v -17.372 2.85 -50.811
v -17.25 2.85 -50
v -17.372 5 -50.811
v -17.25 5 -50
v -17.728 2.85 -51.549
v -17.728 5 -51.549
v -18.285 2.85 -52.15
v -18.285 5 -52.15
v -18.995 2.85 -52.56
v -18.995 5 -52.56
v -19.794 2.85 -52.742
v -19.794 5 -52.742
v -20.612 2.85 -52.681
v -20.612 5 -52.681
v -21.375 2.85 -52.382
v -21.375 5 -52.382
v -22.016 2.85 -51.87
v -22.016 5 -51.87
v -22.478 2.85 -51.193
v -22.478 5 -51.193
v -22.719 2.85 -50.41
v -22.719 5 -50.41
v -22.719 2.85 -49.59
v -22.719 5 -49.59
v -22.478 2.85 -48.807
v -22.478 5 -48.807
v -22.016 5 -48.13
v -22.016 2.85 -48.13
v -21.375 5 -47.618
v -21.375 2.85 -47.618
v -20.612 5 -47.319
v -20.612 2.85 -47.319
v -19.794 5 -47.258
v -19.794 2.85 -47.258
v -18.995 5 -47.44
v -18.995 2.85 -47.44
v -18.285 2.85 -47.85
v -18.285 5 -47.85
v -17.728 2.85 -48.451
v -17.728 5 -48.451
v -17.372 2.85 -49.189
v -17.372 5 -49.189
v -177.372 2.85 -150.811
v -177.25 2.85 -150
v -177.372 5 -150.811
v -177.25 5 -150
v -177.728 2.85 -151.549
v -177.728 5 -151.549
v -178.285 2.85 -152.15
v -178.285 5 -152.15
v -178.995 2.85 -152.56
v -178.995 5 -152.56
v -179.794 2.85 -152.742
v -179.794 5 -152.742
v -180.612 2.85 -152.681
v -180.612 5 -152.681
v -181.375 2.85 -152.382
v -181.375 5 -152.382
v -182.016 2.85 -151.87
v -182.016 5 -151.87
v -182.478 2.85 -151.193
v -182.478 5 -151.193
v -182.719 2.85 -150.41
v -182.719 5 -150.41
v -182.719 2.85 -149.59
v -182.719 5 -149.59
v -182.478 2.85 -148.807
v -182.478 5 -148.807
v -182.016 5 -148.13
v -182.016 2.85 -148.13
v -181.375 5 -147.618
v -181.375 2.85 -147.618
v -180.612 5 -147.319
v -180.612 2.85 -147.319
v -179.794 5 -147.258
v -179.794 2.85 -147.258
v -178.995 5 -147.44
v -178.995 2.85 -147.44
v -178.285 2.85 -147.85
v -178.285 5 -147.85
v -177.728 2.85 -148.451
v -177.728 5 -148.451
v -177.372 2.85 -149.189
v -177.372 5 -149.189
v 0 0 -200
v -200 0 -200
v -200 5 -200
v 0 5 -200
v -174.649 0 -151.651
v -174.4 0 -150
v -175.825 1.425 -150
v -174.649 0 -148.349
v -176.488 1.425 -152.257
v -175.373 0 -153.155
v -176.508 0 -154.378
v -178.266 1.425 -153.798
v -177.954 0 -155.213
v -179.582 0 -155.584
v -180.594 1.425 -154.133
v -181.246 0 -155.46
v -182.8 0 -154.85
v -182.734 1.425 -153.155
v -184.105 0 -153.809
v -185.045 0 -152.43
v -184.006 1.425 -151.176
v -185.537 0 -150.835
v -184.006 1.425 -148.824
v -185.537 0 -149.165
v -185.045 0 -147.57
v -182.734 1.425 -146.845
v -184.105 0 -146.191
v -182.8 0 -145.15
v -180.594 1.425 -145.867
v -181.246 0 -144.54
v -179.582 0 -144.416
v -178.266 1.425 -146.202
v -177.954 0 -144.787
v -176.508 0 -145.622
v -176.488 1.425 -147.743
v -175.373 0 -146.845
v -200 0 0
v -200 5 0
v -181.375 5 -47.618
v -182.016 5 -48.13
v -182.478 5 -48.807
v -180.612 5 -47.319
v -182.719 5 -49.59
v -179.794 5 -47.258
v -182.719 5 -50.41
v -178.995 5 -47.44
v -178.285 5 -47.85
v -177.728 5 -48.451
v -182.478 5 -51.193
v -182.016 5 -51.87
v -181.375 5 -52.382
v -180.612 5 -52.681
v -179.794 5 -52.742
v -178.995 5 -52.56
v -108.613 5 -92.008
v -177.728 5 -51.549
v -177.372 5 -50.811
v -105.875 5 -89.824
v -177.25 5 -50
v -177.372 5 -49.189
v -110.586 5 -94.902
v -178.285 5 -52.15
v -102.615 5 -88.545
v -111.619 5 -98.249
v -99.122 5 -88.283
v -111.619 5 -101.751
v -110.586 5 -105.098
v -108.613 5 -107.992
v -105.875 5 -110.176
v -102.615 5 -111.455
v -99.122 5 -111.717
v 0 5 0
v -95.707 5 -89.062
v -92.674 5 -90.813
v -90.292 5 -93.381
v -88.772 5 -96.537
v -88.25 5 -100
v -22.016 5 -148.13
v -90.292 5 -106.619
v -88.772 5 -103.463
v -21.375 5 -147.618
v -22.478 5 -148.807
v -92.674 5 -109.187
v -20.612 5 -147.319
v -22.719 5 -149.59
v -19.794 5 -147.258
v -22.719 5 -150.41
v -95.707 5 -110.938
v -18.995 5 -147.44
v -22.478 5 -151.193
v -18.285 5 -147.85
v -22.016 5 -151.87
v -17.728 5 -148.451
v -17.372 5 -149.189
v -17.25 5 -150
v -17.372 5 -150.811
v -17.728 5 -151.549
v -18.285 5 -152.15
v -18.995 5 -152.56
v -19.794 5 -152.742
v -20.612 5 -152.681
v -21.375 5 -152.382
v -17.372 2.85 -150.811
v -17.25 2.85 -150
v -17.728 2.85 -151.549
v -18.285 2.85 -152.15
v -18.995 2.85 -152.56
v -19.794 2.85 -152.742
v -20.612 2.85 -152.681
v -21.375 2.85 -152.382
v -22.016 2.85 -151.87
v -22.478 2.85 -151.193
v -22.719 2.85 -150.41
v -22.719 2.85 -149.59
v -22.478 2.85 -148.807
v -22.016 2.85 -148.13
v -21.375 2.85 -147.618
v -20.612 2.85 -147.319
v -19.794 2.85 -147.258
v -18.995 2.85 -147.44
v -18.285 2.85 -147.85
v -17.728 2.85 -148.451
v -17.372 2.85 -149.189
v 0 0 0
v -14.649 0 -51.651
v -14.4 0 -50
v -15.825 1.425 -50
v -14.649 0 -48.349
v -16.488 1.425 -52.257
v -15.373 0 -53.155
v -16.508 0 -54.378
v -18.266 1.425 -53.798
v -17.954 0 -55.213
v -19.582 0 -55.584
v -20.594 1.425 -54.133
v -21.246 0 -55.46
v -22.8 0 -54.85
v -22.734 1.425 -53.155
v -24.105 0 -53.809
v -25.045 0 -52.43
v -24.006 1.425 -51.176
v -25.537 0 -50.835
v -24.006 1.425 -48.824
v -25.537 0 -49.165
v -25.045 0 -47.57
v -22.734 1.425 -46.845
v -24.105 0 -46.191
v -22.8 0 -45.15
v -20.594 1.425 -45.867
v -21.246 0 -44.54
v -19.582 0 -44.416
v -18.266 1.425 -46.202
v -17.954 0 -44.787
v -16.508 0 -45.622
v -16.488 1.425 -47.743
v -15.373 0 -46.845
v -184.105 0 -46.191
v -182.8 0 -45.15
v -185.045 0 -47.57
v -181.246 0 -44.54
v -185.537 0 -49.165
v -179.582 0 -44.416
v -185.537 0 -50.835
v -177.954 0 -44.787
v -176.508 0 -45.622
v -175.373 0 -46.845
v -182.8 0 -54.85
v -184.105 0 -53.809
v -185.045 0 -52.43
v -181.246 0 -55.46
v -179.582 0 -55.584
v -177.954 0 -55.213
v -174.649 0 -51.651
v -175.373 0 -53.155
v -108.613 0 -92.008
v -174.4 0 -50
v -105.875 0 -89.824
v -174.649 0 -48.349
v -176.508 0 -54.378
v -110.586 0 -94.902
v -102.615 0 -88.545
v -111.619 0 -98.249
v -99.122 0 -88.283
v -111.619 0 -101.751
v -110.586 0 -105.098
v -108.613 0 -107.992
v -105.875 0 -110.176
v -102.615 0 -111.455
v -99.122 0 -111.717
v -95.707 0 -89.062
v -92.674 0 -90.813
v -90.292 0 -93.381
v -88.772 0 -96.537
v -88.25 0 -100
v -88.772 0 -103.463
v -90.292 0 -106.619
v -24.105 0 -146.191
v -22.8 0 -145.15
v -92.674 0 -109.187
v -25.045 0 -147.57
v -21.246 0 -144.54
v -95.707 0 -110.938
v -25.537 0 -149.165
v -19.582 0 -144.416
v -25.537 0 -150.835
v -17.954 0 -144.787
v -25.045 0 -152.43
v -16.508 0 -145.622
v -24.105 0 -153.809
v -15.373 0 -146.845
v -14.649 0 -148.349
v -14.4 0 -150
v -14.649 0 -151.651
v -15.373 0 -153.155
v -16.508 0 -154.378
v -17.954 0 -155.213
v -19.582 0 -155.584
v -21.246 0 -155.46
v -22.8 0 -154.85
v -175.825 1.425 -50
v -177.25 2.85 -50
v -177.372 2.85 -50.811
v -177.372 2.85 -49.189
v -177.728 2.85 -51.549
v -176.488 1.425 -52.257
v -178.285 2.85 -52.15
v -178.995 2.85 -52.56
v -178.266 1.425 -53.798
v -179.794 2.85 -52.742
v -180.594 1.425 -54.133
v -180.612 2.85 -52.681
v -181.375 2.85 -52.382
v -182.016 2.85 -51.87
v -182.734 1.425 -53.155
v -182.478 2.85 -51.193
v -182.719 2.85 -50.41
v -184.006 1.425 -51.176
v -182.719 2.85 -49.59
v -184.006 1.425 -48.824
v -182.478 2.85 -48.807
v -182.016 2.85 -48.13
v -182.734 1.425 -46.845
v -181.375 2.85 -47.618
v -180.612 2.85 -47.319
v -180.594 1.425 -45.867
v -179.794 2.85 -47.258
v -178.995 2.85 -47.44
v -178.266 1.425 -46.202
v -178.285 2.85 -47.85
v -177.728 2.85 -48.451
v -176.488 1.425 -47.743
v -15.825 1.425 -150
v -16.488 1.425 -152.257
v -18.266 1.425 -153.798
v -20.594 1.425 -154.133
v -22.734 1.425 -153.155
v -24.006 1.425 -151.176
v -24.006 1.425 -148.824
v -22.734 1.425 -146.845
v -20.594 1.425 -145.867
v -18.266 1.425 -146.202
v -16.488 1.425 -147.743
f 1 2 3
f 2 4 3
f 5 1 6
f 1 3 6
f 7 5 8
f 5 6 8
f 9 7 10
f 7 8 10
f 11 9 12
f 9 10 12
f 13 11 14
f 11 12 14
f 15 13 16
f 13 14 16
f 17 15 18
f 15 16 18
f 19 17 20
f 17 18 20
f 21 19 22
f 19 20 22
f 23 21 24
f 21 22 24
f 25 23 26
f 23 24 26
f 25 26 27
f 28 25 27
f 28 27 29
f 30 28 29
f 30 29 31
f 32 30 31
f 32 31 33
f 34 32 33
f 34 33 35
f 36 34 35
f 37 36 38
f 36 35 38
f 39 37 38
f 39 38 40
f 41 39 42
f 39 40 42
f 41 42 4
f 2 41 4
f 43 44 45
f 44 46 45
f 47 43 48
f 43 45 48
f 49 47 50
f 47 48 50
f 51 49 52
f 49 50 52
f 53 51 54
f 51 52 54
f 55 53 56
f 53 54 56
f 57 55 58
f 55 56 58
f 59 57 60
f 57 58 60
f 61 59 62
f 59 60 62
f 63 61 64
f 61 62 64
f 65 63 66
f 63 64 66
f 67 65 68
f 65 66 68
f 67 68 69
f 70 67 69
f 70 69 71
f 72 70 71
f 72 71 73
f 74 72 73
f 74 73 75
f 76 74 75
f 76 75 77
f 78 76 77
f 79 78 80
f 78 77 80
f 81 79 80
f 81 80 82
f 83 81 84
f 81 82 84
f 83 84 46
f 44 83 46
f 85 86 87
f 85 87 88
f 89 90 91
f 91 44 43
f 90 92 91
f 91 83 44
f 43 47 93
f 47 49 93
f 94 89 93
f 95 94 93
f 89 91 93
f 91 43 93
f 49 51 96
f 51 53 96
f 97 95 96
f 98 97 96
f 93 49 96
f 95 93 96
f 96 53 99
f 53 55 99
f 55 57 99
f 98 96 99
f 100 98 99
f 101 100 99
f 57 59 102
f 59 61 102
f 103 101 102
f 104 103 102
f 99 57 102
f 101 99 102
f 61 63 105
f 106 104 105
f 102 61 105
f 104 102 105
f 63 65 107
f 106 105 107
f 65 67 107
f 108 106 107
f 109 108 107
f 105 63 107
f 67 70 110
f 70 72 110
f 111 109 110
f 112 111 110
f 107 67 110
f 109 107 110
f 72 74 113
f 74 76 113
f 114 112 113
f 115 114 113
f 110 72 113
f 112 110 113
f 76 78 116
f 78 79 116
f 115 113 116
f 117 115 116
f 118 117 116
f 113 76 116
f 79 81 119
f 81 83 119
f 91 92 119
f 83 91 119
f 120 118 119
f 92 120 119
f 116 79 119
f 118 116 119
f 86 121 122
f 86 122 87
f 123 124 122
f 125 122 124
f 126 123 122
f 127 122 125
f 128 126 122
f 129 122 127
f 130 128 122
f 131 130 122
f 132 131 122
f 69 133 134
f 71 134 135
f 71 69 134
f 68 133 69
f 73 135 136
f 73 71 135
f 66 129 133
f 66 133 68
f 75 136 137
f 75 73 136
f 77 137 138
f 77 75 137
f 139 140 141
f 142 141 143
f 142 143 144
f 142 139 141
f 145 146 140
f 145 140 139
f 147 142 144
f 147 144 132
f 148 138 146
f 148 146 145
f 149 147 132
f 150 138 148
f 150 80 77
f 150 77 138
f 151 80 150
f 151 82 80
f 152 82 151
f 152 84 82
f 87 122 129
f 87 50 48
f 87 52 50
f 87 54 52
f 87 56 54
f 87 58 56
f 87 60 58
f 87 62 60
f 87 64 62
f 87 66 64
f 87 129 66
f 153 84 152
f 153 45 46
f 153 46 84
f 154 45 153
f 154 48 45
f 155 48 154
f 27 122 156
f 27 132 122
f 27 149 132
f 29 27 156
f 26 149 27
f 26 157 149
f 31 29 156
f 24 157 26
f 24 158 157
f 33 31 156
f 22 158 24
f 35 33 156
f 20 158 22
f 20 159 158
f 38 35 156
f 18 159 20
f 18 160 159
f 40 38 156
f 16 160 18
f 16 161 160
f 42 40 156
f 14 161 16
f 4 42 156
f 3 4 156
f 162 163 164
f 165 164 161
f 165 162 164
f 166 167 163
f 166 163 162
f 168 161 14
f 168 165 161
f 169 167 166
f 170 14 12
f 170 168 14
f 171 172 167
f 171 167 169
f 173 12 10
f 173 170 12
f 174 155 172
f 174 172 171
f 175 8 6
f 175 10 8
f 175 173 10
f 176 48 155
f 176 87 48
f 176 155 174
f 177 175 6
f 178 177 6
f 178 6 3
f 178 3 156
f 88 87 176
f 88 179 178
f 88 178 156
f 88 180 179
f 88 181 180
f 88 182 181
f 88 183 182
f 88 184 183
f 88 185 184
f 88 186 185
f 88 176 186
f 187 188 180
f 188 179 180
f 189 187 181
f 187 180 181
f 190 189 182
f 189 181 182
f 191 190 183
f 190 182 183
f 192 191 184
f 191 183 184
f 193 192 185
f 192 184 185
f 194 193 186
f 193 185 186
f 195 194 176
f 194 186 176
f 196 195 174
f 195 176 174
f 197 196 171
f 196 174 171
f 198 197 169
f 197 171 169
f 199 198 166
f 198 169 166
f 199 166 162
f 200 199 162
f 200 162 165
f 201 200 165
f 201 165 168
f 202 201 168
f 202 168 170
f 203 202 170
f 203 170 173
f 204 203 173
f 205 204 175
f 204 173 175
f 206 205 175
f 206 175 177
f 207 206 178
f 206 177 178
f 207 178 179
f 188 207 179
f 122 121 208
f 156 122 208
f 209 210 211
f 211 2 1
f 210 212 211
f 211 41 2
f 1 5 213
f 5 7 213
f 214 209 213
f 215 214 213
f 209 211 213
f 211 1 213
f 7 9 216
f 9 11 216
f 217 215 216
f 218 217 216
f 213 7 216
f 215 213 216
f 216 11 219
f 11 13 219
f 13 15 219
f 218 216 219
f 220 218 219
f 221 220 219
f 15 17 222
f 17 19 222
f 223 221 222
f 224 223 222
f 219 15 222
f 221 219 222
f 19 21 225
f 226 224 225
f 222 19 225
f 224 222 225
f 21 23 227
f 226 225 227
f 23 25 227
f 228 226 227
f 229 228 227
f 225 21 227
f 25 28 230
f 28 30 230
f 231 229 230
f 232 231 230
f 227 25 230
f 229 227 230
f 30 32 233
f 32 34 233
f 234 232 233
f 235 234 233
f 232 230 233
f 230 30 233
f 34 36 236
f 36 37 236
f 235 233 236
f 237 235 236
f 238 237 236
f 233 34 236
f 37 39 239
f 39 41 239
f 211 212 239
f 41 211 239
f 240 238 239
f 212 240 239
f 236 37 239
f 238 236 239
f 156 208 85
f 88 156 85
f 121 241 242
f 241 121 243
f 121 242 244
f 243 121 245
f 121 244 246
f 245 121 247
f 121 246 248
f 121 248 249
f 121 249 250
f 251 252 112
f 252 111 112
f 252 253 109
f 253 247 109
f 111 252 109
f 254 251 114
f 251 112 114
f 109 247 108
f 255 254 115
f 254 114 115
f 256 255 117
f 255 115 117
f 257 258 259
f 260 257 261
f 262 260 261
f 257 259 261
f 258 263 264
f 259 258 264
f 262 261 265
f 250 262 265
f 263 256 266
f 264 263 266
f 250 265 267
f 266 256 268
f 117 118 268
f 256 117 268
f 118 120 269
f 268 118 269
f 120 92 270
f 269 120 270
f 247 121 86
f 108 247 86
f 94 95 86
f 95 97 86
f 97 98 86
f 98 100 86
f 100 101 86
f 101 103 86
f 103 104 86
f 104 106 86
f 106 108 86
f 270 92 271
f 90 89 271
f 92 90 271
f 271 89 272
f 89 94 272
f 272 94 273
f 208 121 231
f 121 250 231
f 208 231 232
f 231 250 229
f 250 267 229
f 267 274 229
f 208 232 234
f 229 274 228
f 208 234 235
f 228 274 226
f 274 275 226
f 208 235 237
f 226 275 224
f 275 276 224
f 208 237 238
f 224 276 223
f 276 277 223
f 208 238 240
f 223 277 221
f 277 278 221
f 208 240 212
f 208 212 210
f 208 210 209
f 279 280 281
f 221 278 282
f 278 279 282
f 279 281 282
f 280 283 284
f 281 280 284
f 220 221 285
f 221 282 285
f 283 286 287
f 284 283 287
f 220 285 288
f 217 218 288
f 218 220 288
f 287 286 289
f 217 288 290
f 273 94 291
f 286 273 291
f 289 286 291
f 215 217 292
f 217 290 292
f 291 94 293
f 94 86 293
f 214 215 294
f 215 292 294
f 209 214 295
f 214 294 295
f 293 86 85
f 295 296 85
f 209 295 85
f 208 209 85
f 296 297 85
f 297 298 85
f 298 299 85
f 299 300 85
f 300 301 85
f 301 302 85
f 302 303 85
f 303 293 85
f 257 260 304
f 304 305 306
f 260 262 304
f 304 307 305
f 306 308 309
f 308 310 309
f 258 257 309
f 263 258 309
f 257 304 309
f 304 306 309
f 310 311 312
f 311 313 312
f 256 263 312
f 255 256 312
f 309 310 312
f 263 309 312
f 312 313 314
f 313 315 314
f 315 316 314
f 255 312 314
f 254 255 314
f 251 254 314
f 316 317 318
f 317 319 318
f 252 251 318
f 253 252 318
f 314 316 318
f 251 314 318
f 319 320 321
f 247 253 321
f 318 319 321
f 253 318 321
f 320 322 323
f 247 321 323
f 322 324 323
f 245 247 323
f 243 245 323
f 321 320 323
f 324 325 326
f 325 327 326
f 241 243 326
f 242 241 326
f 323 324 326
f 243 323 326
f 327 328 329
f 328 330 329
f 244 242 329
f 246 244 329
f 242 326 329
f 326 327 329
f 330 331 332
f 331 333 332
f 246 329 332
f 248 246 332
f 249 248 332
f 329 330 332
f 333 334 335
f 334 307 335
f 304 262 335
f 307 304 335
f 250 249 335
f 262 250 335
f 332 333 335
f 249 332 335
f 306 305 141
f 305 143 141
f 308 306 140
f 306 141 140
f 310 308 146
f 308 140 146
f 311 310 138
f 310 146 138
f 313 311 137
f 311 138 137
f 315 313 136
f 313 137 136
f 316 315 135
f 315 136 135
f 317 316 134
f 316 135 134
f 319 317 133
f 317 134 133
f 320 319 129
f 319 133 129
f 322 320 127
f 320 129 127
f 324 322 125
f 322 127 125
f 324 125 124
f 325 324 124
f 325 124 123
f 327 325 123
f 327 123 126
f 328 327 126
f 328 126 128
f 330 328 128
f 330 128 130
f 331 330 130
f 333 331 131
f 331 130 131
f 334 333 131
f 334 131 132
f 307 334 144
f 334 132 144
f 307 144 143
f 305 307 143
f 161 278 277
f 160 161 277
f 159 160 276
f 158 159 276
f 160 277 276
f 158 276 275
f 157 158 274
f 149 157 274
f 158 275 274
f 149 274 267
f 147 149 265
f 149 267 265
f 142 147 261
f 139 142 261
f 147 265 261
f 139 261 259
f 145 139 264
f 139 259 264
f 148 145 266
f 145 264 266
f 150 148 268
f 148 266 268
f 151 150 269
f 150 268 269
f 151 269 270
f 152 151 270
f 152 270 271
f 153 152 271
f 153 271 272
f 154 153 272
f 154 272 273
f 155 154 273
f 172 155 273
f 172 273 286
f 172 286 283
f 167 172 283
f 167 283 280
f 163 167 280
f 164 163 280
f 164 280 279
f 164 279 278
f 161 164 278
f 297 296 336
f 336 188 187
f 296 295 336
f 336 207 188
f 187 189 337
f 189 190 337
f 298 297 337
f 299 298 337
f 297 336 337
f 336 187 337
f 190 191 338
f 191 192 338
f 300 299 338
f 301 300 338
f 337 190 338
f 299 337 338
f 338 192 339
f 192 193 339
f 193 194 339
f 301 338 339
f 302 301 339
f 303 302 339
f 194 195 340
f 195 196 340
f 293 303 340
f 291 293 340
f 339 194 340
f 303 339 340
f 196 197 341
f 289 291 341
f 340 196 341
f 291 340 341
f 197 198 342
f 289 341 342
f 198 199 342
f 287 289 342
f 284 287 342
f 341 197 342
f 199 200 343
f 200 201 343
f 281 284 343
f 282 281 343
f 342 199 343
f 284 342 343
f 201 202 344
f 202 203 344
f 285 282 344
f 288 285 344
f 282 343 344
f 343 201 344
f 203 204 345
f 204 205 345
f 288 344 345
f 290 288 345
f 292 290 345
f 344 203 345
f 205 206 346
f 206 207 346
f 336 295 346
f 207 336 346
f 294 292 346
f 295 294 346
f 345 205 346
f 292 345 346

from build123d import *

# Parameters (mm, degrees)
SKETCH1_W                                           = 200
SKETCH1_H                                           = 200
BOSS_EXTRUDE1_DEPTH                                 = 5
CSK_FOR_M5_COUNTERSUNK_FLAT_HEAD_SCREW1_D           = 5.5
CSK_FOR_M5_COUNTERSUNK_FLAT_HEAD_SCREW1_DEPTH       = 10
CSK_FOR_M5_COUNTERSUNK_FLAT_HEAD_SCREW1_CSINK_D     = 11.2
CSK_FOR_M5_COUNTERSUNK_FLAT_HEAD_SCREW1_CSINK_ANGLE = 90
CSK_FOR_M5_COUNTERSUNK_FLAT_HEAD_SCREW1_TIP         = 1.652366702
SKETCH5_R                                           = 11.75
CUT_EXTRUDE1_DEPTH                                  = 10


with BuildPart() as part:
    # Sketch1 → Boss-Extrude1 (new body)
    with BuildSketch(Plane(origin=(0, 0, 0), x_dir=(1, 0, 0), z_dir=(0, 1, 0))):
        with Locations((-100, 100)):
            Rectangle(SKETCH1_W, SKETCH1_H)
    extrude(amount=BOSS_EXTRUDE1_DEPTH)

    # CSK for M5 Countersunk Flat Head Screw1
    with Locations(Plane(origin=(0, 0, 0), x_dir=(-1, 0, 0), z_dir=(0, -1, 0))):
        with Locations((180, 50), (180, 150), (20, 50), (20, 150)):
            CounterSinkHole(CSK_FOR_M5_COUNTERSUNK_FLAT_HEAD_SCREW1_D / 2, CSK_FOR_M5_COUNTERSUNK_FLAT_HEAD_SCREW1_CSINK_D / 2, depth=CSK_FOR_M5_COUNTERSUNK_FLAT_HEAD_SCREW1_DEPTH, counter_sink_angle=CSK_FOR_M5_COUNTERSUNK_FLAT_HEAD_SCREW1_CSINK_ANGLE)
            with Locations((0, 0, -(CSK_FOR_M5_COUNTERSUNK_FLAT_HEAD_SCREW1_DEPTH + CSK_FOR_M5_COUNTERSUNK_FLAT_HEAD_SCREW1_TIP / 2))):  # 118° drill point
                Cone(0, CSK_FOR_M5_COUNTERSUNK_FLAT_HEAD_SCREW1_D / 2, CSK_FOR_M5_COUNTERSUNK_FLAT_HEAD_SCREW1_TIP, mode=Mode.SUBTRACT)

    # Sketch5 → Cut-Extrude1 (cut)
    with BuildSketch(Plane.XZ):
        with Locations((-100, -100)):
            Circle(SKETCH5_R)
    extrude(amount=-CUT_EXTRUDE1_DEPTH, mode=Mode.SUBTRACT)


solid = part.part
